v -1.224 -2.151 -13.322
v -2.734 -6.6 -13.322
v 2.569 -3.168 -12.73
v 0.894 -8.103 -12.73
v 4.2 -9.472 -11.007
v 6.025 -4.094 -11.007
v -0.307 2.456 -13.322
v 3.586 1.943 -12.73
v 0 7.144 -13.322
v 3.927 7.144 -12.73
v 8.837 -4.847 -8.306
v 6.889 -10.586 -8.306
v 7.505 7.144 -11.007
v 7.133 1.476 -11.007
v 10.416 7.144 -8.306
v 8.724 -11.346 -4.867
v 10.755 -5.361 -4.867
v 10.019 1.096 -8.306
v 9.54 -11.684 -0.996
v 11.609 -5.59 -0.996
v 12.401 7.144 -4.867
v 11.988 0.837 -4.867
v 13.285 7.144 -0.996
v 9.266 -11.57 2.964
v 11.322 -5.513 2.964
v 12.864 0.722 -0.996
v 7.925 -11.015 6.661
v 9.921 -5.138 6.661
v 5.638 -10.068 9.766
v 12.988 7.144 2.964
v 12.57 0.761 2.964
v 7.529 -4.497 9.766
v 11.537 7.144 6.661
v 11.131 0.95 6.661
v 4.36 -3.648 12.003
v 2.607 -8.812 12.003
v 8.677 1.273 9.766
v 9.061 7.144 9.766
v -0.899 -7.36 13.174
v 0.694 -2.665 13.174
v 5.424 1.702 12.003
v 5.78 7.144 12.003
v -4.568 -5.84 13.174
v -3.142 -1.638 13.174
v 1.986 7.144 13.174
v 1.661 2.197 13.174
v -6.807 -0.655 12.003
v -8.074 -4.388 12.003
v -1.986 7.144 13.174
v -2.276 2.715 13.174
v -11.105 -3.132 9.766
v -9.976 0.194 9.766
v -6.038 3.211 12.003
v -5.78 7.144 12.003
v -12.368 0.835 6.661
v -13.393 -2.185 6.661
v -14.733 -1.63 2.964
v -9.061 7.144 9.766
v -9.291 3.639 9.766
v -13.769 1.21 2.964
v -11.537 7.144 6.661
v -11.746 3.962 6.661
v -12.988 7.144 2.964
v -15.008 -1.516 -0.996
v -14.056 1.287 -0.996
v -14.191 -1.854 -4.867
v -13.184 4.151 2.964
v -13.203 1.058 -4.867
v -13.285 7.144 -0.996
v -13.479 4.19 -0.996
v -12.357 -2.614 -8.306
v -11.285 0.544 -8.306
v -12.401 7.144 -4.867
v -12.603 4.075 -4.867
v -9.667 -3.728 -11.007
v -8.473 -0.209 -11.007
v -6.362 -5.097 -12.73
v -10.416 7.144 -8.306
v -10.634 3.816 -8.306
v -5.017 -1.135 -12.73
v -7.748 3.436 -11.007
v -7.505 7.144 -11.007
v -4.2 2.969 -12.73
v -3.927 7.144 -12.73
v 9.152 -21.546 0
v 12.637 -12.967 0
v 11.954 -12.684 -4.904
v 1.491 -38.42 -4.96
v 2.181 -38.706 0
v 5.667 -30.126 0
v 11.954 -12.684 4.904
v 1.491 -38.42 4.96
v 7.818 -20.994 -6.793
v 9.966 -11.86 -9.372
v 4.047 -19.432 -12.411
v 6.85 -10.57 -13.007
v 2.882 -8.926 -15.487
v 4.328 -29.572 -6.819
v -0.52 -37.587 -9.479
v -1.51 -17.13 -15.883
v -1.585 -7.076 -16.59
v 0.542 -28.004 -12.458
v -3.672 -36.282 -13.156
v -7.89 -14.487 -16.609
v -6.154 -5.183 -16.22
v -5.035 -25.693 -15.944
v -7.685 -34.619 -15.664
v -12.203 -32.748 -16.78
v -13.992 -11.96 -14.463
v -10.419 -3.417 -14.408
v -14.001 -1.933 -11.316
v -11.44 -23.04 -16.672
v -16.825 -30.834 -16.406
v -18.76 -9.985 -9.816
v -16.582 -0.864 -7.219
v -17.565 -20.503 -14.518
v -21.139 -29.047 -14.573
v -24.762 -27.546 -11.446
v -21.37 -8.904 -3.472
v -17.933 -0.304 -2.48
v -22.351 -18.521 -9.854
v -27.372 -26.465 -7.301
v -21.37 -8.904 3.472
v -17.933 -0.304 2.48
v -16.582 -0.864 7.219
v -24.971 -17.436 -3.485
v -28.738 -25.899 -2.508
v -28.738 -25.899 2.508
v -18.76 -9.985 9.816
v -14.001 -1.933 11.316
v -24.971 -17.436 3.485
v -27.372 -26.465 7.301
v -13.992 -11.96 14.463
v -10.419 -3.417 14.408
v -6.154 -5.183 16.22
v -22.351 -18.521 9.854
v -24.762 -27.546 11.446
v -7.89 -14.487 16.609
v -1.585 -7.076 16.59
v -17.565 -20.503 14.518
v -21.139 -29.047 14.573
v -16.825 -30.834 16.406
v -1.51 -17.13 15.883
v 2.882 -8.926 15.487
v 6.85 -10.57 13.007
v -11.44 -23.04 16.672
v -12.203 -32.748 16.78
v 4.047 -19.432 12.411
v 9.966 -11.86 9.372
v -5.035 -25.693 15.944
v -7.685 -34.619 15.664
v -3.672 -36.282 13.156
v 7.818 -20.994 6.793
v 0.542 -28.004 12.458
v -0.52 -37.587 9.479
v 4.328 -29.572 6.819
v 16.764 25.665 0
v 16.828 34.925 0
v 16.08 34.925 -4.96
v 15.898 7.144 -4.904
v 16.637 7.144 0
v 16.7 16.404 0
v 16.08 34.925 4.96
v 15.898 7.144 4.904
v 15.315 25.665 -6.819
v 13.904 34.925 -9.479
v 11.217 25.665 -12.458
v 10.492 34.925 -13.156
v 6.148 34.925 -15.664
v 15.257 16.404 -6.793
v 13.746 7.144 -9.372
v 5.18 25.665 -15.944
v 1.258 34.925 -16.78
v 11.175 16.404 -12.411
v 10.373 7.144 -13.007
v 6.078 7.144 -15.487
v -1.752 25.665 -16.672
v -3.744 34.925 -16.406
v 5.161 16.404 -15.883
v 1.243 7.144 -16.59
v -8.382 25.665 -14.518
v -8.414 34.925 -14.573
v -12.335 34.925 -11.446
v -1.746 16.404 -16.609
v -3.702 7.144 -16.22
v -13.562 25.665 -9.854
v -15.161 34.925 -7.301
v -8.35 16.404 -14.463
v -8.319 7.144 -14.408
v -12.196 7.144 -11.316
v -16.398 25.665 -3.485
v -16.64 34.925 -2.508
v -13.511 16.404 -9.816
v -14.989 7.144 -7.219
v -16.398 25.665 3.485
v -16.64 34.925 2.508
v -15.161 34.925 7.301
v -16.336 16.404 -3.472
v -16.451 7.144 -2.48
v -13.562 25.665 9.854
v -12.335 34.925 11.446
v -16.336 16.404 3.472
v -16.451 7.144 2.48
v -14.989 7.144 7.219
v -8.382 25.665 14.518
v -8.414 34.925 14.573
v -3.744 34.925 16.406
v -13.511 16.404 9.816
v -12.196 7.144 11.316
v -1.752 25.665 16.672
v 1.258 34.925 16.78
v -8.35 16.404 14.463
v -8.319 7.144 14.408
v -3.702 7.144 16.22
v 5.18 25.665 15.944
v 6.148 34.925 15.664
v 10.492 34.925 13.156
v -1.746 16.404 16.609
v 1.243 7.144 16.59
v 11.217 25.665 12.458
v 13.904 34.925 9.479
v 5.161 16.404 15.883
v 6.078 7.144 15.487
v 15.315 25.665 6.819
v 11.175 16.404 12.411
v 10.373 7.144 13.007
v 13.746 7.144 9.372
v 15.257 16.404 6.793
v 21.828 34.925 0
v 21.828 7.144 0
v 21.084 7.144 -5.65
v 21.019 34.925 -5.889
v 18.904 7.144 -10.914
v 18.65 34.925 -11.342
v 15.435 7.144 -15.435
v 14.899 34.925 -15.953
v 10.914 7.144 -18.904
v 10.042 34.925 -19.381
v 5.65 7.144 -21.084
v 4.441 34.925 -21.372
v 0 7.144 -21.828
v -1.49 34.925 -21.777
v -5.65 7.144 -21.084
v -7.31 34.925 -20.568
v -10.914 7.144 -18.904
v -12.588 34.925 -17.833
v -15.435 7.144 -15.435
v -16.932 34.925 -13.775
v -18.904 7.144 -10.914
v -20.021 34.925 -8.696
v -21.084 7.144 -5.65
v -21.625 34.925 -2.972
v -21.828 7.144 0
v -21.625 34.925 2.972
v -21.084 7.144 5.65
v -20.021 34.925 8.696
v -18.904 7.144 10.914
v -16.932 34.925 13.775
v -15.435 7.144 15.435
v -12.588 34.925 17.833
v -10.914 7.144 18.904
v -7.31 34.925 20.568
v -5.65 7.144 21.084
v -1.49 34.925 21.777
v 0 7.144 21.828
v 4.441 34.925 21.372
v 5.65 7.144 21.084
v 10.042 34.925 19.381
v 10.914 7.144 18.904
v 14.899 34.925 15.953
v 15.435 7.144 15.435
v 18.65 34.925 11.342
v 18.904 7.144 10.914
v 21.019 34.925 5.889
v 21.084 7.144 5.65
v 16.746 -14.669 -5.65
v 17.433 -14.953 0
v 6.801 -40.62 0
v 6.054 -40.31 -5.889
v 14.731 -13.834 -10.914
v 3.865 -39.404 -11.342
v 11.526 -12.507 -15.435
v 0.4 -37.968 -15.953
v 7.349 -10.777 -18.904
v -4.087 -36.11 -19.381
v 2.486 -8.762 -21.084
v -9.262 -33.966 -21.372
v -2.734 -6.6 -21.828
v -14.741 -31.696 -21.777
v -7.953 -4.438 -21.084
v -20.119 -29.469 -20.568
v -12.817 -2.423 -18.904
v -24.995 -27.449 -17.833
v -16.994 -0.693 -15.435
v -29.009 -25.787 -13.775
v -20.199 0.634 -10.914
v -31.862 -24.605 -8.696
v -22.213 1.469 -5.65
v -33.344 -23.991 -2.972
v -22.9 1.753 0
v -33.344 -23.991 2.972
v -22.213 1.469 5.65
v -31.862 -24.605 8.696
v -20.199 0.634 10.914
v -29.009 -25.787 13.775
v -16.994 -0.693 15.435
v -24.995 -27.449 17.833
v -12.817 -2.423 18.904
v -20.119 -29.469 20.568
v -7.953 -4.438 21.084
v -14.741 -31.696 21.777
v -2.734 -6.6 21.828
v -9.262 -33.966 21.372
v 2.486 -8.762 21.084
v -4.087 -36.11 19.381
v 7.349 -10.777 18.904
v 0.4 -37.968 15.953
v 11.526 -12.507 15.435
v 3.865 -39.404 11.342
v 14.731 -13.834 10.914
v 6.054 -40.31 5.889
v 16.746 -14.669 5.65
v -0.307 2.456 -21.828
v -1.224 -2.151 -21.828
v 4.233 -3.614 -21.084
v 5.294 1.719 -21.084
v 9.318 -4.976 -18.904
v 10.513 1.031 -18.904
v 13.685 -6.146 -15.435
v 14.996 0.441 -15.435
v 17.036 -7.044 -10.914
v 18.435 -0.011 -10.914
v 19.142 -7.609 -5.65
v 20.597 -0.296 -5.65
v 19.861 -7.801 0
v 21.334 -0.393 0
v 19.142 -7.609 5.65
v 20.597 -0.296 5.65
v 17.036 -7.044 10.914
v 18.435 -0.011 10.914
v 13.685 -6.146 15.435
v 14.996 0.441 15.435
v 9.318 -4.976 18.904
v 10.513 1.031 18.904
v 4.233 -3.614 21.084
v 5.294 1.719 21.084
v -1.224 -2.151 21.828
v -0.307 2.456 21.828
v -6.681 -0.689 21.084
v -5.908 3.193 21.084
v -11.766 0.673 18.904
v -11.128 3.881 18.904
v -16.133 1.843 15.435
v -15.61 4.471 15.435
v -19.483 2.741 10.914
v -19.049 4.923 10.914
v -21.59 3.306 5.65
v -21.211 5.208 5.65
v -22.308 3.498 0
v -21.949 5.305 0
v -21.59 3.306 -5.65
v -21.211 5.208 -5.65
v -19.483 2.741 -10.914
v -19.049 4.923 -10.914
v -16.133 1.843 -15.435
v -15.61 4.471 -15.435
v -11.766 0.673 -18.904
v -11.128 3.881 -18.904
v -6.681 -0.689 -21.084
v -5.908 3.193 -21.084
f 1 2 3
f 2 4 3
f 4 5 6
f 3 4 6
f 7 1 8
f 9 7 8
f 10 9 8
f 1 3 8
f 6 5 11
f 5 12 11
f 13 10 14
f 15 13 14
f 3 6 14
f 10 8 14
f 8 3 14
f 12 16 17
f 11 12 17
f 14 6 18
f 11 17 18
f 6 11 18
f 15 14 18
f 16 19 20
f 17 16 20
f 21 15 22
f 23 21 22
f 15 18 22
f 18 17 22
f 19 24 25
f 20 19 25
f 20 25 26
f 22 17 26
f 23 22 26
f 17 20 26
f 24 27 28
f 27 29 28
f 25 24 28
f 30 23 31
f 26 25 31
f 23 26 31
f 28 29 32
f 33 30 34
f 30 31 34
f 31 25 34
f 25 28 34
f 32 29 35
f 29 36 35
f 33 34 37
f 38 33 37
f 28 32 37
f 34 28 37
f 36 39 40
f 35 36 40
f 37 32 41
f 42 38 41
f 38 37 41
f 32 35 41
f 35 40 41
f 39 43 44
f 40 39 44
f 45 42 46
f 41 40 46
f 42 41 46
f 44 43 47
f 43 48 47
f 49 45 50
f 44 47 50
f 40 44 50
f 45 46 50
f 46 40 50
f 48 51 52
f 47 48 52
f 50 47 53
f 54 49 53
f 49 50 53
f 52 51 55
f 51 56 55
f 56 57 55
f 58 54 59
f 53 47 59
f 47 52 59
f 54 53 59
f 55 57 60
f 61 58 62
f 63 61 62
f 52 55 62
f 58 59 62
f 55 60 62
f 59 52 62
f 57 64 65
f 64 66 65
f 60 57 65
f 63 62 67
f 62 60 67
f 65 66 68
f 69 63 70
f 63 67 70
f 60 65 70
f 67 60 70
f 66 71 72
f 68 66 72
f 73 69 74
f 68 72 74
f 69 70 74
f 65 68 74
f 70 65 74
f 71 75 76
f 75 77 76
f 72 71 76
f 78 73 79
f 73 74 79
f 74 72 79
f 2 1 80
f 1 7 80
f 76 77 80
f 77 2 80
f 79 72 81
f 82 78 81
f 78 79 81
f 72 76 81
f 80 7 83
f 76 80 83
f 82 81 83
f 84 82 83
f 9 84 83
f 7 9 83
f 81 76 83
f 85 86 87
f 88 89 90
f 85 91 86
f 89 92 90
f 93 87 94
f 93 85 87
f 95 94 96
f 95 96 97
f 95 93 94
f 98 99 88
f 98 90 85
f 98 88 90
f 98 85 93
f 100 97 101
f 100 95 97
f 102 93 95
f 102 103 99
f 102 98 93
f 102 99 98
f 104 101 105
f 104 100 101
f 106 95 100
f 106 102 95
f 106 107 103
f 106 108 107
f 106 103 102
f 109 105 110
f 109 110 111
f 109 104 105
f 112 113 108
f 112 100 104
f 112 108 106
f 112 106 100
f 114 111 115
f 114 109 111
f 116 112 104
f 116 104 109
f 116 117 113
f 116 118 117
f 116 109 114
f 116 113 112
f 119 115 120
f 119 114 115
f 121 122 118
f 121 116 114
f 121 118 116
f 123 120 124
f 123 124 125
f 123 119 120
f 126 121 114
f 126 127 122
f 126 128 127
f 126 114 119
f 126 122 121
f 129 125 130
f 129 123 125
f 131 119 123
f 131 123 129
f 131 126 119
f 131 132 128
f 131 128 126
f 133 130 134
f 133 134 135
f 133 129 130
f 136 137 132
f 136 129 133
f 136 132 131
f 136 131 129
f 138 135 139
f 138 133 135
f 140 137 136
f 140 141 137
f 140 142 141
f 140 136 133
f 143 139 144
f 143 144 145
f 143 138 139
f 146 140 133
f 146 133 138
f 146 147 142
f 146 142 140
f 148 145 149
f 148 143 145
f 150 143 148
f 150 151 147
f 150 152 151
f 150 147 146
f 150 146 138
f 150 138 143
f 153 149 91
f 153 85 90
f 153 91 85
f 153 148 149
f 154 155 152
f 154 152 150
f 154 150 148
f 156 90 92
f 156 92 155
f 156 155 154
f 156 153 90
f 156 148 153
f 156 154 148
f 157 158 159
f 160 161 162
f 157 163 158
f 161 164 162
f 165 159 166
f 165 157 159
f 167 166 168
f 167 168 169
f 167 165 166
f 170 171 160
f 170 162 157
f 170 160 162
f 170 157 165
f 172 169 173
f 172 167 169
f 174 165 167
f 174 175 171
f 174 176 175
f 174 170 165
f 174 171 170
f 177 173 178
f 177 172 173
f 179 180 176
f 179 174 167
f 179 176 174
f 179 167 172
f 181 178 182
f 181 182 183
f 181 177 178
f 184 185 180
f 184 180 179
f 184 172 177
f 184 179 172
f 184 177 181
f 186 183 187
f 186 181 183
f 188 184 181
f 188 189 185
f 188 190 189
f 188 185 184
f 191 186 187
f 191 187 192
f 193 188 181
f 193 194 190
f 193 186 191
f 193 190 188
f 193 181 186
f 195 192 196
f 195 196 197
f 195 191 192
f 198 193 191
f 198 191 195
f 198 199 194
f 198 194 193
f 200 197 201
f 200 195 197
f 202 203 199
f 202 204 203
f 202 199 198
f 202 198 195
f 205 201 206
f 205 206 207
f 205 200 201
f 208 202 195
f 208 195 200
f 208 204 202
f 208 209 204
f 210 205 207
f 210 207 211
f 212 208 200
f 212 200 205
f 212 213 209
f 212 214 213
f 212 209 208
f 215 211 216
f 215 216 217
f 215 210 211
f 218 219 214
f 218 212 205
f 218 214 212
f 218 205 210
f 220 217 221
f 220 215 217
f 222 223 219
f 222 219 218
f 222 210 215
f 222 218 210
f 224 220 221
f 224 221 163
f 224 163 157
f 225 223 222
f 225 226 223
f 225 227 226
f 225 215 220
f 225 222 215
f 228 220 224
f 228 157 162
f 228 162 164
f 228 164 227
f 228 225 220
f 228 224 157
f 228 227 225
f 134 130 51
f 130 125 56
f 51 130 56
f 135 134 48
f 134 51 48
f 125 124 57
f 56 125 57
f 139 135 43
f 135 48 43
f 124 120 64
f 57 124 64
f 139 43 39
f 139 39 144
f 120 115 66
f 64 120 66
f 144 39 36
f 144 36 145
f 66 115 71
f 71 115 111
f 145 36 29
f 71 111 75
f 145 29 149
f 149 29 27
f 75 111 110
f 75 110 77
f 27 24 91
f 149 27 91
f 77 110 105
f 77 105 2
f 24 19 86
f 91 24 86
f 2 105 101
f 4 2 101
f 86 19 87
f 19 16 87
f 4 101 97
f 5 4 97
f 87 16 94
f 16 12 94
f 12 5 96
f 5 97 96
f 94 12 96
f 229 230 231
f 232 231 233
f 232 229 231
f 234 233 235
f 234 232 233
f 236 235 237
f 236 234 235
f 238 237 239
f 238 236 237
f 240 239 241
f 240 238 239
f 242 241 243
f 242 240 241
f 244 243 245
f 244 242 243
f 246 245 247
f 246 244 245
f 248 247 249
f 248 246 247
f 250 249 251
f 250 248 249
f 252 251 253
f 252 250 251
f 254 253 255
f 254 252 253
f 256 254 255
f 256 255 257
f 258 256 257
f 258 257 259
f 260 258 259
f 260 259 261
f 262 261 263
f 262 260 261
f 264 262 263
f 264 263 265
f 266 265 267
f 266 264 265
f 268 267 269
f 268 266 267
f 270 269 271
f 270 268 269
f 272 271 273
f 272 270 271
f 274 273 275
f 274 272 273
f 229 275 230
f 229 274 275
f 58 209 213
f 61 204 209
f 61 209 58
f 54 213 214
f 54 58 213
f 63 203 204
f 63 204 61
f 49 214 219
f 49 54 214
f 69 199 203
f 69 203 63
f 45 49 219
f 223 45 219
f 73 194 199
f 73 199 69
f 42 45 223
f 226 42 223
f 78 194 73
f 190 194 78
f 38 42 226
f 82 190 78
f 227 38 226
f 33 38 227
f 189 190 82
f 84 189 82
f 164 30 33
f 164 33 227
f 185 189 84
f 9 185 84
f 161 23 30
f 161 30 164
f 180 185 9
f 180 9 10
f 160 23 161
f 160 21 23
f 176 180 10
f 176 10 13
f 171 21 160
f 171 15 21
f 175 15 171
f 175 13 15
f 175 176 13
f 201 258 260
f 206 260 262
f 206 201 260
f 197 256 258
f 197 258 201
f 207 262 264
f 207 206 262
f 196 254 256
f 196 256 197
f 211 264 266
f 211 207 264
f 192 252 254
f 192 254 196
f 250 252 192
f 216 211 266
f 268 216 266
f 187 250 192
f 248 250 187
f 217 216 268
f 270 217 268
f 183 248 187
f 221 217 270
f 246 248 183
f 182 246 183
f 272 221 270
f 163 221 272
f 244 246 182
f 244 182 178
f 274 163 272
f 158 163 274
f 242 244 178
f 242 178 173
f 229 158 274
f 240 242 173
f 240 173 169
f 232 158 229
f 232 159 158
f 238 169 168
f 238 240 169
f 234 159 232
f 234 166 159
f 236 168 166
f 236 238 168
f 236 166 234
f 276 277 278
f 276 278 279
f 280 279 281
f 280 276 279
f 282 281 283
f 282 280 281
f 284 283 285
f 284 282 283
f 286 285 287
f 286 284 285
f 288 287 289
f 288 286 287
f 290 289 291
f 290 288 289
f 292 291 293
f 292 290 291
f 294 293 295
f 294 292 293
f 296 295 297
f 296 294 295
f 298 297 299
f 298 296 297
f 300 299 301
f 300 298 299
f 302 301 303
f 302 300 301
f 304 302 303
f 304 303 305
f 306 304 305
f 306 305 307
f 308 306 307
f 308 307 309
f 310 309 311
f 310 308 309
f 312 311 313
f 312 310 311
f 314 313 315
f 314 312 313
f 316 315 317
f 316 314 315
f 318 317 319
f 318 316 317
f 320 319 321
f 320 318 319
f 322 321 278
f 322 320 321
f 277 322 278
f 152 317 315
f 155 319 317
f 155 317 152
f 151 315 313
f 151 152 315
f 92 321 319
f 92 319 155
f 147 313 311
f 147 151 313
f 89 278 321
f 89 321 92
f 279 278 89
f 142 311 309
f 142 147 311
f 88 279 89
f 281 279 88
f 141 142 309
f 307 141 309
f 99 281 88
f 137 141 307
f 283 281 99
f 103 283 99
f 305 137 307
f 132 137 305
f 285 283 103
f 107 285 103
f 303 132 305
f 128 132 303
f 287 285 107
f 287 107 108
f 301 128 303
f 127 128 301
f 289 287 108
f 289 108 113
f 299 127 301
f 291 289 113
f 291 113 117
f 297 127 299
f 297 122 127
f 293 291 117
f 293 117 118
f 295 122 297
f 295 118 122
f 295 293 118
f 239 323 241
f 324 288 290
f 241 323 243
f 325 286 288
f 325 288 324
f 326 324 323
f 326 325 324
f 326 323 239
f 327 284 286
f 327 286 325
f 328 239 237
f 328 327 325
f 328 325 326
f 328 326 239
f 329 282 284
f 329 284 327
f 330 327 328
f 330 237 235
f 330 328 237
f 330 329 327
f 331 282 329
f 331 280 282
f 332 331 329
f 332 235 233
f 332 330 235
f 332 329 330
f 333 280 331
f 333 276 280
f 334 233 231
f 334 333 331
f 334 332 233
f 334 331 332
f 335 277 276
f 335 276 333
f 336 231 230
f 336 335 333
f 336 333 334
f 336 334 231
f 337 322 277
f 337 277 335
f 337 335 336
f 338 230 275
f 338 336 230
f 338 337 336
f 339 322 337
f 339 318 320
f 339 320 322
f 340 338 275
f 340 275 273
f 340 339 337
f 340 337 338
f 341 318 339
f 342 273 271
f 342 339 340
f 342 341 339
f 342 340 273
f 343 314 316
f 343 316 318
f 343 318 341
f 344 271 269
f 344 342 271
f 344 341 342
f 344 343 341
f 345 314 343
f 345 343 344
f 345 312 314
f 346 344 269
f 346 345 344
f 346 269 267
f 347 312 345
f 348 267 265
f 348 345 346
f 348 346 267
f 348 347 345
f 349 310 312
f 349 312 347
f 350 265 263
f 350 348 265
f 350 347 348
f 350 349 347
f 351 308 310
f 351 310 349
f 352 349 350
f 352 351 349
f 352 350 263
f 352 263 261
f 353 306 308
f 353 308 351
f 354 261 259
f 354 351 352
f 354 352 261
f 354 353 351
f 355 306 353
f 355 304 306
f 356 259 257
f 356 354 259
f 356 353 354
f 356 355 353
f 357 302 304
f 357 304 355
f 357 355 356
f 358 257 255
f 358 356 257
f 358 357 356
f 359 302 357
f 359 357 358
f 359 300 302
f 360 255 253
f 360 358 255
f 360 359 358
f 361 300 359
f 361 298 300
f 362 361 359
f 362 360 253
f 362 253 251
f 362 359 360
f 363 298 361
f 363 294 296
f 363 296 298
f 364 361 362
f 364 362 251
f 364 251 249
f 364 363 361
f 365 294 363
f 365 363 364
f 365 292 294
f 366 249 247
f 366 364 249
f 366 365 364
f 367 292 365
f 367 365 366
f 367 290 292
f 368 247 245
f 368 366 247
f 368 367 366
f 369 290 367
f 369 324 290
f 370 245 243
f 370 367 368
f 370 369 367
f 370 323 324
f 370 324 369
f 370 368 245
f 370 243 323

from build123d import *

# Parameters (mm, degrees)
SKETCH3_R   = 21.828125
SKETCH3_R_2 = 13.3223


with BuildPart() as part:
    # Sketch1 → Revolve1 (revolve)
    with BuildSketch(Plane.XY):
        Polygon((6.801339045, -40.61975447), (17.432763151, -14.953226207), (12.636789012, -12.966668675), (2.181363958, -38.706098131), align=None)
    revolve(axis=Axis((-13.365218875, -32.266492673, 0), (0.382683432, 0.923879533, 0)))



with BuildPart() as body_2:
    # Sketch2 → Revolve2 (revolve)
    with BuildSketch(Plane.XY):
        Polygon((16.8275, 34.925), (16.637, 7.14375), (21.828125, 7.14375), (21.828125, 34.925), align=None)
    revolve(axis=Axis((0, 0, 0), (0, 1, 0)))


with BuildPart() as part_1:
    add(part.part)

    add(body_2.part)  # Sweep1 merges body 2
    # Sweep1: sweep along a path in Sketch4
    with BuildLine(Plane.XY) as sweep1_path:
        ThreePointArc((-2.73379477, -6.59996441), (-0.690078525, 0.137265153), (0, 7.14375))
    # Sketch3 → Sweep1 (sweep)
    with BuildSketch(Plane(origin=(-2.73379477, -6.59996441, 0), x_dir=(0, 0, -1), z_dir=(0.382683432, 0.923879533, 0))):
        Circle(SKETCH3_R)
        Circle(SKETCH3_R_2, mode=Mode.SUBTRACT)
    sweep(path=sweep1_path.line)


solid = part_1.part
